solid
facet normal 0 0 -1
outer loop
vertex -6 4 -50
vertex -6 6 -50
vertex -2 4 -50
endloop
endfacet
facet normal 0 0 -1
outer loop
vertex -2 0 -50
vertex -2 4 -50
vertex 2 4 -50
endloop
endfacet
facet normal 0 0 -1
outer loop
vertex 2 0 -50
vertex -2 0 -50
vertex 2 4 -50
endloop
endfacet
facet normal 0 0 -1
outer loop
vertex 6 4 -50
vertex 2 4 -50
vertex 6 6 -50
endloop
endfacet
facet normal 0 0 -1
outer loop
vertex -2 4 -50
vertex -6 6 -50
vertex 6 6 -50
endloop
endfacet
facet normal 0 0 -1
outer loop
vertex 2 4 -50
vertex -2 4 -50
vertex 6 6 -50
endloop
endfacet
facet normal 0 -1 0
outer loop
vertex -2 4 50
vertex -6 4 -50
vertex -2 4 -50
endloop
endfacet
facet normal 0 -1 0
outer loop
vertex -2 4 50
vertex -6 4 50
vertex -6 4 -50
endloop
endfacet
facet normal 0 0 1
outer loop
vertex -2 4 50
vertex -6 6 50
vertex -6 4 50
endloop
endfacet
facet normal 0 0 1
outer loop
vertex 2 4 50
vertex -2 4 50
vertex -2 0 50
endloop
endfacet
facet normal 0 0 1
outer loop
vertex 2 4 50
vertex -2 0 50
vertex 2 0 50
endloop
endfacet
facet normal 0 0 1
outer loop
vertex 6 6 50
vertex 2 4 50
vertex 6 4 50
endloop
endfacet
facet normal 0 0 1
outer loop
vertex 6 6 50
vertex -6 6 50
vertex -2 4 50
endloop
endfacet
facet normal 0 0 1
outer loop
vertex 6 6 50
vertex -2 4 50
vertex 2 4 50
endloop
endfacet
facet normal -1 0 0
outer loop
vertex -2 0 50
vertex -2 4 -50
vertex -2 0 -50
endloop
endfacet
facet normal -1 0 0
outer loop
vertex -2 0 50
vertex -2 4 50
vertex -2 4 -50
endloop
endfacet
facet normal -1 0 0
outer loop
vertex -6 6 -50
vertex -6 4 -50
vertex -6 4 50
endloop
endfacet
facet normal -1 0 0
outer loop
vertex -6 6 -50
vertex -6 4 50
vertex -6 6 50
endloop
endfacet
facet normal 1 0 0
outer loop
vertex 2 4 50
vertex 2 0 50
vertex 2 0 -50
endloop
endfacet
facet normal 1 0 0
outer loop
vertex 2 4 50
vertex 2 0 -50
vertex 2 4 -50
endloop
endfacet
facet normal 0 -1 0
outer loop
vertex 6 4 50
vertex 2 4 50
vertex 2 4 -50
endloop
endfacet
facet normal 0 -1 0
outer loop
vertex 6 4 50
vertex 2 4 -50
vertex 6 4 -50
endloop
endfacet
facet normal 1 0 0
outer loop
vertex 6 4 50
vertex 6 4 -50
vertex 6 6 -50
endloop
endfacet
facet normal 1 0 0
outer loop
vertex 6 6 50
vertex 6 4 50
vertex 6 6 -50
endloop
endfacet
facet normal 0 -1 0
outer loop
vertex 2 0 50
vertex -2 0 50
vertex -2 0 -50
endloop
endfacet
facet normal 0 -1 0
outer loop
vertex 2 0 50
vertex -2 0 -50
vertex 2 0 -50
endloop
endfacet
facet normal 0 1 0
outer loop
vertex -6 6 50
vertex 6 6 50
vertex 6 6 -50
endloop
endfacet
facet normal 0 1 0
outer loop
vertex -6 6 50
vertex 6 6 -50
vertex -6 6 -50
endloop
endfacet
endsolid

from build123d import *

# Parameters (mm, degrees)
F0_W     = 2
F0_H     = 2
F0_W_2   = 4
F1_DEPTH = 50


with BuildPart() as f1:
    # F0 (on Top) → F1 (new body, symmetric)
    with BuildSketch(Plane.XY):
        with Locations((-1, 5)):
            Rectangle(F0_W, F0_H)
        with Locations((1, 5)):
            Rectangle(F0_W, F0_H)
        with Locations((4, 5)):
            Rectangle(F0_W_2, F0_H)
        Polygon((-2, 4), (-2, 0), (2, 0), (2, 4), (0, 4), align=None)
        with Locations((-4, 5)):
            Rectangle(F0_W_2, F0_H)
    extrude(amount=F1_DEPTH, both=True)


solid = f1.part
